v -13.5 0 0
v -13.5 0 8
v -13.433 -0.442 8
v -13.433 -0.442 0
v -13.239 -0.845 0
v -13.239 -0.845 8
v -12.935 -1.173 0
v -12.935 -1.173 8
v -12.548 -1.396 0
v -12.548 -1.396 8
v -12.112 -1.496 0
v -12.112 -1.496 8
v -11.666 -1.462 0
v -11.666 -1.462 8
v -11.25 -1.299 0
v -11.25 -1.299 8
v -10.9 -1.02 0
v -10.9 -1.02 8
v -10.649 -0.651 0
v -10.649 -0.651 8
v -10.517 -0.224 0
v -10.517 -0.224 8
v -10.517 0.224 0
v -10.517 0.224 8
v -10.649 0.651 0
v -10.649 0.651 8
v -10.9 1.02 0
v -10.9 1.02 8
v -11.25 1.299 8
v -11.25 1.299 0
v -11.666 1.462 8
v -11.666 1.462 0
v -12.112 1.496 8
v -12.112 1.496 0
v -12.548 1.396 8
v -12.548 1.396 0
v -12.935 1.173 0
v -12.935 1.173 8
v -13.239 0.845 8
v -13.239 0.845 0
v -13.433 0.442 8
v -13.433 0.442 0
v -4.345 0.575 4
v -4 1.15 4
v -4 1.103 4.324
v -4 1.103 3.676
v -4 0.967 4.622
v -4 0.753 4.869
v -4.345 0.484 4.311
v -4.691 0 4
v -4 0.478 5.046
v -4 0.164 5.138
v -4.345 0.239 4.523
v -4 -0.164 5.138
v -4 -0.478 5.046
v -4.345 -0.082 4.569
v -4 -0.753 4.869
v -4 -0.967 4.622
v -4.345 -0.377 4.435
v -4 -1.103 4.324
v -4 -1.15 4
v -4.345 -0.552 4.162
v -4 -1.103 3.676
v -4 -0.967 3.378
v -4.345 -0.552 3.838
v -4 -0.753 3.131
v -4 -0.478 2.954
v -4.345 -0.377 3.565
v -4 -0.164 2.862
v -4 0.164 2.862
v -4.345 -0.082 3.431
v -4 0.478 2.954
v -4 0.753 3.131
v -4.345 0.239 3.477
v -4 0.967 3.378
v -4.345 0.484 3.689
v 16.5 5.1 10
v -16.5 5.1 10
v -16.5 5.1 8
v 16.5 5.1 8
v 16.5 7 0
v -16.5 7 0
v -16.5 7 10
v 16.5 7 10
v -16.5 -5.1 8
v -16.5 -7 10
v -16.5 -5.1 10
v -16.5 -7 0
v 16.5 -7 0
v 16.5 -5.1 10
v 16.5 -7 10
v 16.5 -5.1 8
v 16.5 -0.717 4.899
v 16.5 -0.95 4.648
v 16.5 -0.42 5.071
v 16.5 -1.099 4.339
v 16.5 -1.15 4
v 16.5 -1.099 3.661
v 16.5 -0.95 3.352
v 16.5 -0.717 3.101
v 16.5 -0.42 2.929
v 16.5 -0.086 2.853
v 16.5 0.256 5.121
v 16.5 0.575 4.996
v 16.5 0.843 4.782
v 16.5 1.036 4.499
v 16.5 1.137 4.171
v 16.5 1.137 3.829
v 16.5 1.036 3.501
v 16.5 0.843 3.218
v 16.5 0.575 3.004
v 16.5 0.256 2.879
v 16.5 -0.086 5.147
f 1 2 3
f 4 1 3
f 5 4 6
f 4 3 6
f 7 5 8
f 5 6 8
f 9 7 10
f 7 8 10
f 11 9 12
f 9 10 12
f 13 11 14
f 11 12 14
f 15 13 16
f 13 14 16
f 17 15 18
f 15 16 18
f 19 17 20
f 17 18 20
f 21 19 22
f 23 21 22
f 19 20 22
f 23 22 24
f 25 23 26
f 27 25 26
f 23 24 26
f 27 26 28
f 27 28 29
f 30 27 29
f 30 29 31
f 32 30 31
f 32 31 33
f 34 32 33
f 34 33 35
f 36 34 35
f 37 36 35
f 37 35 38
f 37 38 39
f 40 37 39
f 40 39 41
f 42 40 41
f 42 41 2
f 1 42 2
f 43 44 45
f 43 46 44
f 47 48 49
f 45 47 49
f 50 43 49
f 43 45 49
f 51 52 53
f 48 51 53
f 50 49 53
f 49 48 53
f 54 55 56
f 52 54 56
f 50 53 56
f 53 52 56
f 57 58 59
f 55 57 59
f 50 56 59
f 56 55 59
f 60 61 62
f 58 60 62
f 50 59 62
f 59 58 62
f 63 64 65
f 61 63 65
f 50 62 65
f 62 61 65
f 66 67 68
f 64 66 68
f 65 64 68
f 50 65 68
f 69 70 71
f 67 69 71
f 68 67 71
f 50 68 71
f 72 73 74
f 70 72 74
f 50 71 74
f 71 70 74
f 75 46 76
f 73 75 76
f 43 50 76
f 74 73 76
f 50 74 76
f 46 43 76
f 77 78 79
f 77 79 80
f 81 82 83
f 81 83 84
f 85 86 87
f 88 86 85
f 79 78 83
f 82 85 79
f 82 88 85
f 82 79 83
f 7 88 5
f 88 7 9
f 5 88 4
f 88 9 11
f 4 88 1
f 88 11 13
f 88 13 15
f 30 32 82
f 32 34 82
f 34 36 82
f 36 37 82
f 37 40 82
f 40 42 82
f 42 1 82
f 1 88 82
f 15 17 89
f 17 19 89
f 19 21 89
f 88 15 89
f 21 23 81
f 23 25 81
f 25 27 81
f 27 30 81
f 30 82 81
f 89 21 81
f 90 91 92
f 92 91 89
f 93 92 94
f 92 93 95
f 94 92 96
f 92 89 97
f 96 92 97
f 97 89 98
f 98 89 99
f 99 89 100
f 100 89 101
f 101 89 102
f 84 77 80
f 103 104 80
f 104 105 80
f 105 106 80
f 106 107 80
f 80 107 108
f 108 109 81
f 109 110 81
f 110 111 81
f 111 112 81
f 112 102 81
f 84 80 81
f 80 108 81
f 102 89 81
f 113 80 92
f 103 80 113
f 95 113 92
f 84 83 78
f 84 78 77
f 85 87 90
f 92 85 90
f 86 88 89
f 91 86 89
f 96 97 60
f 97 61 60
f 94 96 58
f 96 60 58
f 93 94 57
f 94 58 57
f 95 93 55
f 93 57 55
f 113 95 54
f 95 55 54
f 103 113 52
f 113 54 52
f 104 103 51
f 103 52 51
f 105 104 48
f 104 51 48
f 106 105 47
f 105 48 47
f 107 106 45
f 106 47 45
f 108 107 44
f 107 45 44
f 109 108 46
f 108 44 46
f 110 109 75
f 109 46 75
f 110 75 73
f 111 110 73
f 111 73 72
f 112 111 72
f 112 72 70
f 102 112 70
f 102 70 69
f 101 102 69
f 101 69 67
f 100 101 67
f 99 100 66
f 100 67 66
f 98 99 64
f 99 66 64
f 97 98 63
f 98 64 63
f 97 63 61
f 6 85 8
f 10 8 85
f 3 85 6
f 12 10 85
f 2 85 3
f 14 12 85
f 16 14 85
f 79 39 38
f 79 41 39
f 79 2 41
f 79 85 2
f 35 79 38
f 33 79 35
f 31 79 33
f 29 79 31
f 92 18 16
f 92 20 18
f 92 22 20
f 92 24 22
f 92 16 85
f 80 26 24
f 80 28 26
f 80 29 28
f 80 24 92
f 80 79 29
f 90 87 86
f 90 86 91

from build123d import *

# Parameters (mm, degrees)
F0_W     = 33
F0_H     = 14
F1_DEPTH = 10
F2_W     = 33
F2_H     = 10.2
F3_DEPTH = 2
F4_D     = 3
F4_DEPTH = 20.5
F4_TIP   = 0.9012909285
F6_D     = 2.3
F6_DEPTH = 20.5
F6_TIP   = 0.6909897119


with BuildPart() as f1:
    # F0 (on Top) → F1 (new body)
    with BuildSketch(Plane.XY):
        Rectangle(F0_W, F0_H)
    extrude(amount=F1_DEPTH)

    # F2 (on face) → F3 (cut)
    with BuildSketch(Plane.XY.offset(10)):
        Rectangle(F2_W, F2_H)
    extrude(amount=-F3_DEPTH, mode=Mode.SUBTRACT)

    # F4
    with Locations(Plane(origin=(0, 0, 0), x_dir=(1, 0, 0), z_dir=(0, 0, -1))):
        with Locations((-12, 0)):
            Hole(F4_D / 2, depth=F4_DEPTH)
            with Locations((0, 0, -(F4_DEPTH + F4_TIP / 2))):  # 118° drill point
                Cone(0, F4_D / 2, F4_TIP, mode=Mode.SUBTRACT)

    # F6
    with Locations(Plane.YZ.offset(16.5)):
        with Locations((0, 4)):
            Hole(F6_D / 2, depth=F6_DEPTH)
            with Locations((0, 0, -(F6_DEPTH + F6_TIP / 2))):  # 118° drill point
                Cone(0, F6_D / 2, F6_TIP, mode=Mode.SUBTRACT)


solid = f1.part
